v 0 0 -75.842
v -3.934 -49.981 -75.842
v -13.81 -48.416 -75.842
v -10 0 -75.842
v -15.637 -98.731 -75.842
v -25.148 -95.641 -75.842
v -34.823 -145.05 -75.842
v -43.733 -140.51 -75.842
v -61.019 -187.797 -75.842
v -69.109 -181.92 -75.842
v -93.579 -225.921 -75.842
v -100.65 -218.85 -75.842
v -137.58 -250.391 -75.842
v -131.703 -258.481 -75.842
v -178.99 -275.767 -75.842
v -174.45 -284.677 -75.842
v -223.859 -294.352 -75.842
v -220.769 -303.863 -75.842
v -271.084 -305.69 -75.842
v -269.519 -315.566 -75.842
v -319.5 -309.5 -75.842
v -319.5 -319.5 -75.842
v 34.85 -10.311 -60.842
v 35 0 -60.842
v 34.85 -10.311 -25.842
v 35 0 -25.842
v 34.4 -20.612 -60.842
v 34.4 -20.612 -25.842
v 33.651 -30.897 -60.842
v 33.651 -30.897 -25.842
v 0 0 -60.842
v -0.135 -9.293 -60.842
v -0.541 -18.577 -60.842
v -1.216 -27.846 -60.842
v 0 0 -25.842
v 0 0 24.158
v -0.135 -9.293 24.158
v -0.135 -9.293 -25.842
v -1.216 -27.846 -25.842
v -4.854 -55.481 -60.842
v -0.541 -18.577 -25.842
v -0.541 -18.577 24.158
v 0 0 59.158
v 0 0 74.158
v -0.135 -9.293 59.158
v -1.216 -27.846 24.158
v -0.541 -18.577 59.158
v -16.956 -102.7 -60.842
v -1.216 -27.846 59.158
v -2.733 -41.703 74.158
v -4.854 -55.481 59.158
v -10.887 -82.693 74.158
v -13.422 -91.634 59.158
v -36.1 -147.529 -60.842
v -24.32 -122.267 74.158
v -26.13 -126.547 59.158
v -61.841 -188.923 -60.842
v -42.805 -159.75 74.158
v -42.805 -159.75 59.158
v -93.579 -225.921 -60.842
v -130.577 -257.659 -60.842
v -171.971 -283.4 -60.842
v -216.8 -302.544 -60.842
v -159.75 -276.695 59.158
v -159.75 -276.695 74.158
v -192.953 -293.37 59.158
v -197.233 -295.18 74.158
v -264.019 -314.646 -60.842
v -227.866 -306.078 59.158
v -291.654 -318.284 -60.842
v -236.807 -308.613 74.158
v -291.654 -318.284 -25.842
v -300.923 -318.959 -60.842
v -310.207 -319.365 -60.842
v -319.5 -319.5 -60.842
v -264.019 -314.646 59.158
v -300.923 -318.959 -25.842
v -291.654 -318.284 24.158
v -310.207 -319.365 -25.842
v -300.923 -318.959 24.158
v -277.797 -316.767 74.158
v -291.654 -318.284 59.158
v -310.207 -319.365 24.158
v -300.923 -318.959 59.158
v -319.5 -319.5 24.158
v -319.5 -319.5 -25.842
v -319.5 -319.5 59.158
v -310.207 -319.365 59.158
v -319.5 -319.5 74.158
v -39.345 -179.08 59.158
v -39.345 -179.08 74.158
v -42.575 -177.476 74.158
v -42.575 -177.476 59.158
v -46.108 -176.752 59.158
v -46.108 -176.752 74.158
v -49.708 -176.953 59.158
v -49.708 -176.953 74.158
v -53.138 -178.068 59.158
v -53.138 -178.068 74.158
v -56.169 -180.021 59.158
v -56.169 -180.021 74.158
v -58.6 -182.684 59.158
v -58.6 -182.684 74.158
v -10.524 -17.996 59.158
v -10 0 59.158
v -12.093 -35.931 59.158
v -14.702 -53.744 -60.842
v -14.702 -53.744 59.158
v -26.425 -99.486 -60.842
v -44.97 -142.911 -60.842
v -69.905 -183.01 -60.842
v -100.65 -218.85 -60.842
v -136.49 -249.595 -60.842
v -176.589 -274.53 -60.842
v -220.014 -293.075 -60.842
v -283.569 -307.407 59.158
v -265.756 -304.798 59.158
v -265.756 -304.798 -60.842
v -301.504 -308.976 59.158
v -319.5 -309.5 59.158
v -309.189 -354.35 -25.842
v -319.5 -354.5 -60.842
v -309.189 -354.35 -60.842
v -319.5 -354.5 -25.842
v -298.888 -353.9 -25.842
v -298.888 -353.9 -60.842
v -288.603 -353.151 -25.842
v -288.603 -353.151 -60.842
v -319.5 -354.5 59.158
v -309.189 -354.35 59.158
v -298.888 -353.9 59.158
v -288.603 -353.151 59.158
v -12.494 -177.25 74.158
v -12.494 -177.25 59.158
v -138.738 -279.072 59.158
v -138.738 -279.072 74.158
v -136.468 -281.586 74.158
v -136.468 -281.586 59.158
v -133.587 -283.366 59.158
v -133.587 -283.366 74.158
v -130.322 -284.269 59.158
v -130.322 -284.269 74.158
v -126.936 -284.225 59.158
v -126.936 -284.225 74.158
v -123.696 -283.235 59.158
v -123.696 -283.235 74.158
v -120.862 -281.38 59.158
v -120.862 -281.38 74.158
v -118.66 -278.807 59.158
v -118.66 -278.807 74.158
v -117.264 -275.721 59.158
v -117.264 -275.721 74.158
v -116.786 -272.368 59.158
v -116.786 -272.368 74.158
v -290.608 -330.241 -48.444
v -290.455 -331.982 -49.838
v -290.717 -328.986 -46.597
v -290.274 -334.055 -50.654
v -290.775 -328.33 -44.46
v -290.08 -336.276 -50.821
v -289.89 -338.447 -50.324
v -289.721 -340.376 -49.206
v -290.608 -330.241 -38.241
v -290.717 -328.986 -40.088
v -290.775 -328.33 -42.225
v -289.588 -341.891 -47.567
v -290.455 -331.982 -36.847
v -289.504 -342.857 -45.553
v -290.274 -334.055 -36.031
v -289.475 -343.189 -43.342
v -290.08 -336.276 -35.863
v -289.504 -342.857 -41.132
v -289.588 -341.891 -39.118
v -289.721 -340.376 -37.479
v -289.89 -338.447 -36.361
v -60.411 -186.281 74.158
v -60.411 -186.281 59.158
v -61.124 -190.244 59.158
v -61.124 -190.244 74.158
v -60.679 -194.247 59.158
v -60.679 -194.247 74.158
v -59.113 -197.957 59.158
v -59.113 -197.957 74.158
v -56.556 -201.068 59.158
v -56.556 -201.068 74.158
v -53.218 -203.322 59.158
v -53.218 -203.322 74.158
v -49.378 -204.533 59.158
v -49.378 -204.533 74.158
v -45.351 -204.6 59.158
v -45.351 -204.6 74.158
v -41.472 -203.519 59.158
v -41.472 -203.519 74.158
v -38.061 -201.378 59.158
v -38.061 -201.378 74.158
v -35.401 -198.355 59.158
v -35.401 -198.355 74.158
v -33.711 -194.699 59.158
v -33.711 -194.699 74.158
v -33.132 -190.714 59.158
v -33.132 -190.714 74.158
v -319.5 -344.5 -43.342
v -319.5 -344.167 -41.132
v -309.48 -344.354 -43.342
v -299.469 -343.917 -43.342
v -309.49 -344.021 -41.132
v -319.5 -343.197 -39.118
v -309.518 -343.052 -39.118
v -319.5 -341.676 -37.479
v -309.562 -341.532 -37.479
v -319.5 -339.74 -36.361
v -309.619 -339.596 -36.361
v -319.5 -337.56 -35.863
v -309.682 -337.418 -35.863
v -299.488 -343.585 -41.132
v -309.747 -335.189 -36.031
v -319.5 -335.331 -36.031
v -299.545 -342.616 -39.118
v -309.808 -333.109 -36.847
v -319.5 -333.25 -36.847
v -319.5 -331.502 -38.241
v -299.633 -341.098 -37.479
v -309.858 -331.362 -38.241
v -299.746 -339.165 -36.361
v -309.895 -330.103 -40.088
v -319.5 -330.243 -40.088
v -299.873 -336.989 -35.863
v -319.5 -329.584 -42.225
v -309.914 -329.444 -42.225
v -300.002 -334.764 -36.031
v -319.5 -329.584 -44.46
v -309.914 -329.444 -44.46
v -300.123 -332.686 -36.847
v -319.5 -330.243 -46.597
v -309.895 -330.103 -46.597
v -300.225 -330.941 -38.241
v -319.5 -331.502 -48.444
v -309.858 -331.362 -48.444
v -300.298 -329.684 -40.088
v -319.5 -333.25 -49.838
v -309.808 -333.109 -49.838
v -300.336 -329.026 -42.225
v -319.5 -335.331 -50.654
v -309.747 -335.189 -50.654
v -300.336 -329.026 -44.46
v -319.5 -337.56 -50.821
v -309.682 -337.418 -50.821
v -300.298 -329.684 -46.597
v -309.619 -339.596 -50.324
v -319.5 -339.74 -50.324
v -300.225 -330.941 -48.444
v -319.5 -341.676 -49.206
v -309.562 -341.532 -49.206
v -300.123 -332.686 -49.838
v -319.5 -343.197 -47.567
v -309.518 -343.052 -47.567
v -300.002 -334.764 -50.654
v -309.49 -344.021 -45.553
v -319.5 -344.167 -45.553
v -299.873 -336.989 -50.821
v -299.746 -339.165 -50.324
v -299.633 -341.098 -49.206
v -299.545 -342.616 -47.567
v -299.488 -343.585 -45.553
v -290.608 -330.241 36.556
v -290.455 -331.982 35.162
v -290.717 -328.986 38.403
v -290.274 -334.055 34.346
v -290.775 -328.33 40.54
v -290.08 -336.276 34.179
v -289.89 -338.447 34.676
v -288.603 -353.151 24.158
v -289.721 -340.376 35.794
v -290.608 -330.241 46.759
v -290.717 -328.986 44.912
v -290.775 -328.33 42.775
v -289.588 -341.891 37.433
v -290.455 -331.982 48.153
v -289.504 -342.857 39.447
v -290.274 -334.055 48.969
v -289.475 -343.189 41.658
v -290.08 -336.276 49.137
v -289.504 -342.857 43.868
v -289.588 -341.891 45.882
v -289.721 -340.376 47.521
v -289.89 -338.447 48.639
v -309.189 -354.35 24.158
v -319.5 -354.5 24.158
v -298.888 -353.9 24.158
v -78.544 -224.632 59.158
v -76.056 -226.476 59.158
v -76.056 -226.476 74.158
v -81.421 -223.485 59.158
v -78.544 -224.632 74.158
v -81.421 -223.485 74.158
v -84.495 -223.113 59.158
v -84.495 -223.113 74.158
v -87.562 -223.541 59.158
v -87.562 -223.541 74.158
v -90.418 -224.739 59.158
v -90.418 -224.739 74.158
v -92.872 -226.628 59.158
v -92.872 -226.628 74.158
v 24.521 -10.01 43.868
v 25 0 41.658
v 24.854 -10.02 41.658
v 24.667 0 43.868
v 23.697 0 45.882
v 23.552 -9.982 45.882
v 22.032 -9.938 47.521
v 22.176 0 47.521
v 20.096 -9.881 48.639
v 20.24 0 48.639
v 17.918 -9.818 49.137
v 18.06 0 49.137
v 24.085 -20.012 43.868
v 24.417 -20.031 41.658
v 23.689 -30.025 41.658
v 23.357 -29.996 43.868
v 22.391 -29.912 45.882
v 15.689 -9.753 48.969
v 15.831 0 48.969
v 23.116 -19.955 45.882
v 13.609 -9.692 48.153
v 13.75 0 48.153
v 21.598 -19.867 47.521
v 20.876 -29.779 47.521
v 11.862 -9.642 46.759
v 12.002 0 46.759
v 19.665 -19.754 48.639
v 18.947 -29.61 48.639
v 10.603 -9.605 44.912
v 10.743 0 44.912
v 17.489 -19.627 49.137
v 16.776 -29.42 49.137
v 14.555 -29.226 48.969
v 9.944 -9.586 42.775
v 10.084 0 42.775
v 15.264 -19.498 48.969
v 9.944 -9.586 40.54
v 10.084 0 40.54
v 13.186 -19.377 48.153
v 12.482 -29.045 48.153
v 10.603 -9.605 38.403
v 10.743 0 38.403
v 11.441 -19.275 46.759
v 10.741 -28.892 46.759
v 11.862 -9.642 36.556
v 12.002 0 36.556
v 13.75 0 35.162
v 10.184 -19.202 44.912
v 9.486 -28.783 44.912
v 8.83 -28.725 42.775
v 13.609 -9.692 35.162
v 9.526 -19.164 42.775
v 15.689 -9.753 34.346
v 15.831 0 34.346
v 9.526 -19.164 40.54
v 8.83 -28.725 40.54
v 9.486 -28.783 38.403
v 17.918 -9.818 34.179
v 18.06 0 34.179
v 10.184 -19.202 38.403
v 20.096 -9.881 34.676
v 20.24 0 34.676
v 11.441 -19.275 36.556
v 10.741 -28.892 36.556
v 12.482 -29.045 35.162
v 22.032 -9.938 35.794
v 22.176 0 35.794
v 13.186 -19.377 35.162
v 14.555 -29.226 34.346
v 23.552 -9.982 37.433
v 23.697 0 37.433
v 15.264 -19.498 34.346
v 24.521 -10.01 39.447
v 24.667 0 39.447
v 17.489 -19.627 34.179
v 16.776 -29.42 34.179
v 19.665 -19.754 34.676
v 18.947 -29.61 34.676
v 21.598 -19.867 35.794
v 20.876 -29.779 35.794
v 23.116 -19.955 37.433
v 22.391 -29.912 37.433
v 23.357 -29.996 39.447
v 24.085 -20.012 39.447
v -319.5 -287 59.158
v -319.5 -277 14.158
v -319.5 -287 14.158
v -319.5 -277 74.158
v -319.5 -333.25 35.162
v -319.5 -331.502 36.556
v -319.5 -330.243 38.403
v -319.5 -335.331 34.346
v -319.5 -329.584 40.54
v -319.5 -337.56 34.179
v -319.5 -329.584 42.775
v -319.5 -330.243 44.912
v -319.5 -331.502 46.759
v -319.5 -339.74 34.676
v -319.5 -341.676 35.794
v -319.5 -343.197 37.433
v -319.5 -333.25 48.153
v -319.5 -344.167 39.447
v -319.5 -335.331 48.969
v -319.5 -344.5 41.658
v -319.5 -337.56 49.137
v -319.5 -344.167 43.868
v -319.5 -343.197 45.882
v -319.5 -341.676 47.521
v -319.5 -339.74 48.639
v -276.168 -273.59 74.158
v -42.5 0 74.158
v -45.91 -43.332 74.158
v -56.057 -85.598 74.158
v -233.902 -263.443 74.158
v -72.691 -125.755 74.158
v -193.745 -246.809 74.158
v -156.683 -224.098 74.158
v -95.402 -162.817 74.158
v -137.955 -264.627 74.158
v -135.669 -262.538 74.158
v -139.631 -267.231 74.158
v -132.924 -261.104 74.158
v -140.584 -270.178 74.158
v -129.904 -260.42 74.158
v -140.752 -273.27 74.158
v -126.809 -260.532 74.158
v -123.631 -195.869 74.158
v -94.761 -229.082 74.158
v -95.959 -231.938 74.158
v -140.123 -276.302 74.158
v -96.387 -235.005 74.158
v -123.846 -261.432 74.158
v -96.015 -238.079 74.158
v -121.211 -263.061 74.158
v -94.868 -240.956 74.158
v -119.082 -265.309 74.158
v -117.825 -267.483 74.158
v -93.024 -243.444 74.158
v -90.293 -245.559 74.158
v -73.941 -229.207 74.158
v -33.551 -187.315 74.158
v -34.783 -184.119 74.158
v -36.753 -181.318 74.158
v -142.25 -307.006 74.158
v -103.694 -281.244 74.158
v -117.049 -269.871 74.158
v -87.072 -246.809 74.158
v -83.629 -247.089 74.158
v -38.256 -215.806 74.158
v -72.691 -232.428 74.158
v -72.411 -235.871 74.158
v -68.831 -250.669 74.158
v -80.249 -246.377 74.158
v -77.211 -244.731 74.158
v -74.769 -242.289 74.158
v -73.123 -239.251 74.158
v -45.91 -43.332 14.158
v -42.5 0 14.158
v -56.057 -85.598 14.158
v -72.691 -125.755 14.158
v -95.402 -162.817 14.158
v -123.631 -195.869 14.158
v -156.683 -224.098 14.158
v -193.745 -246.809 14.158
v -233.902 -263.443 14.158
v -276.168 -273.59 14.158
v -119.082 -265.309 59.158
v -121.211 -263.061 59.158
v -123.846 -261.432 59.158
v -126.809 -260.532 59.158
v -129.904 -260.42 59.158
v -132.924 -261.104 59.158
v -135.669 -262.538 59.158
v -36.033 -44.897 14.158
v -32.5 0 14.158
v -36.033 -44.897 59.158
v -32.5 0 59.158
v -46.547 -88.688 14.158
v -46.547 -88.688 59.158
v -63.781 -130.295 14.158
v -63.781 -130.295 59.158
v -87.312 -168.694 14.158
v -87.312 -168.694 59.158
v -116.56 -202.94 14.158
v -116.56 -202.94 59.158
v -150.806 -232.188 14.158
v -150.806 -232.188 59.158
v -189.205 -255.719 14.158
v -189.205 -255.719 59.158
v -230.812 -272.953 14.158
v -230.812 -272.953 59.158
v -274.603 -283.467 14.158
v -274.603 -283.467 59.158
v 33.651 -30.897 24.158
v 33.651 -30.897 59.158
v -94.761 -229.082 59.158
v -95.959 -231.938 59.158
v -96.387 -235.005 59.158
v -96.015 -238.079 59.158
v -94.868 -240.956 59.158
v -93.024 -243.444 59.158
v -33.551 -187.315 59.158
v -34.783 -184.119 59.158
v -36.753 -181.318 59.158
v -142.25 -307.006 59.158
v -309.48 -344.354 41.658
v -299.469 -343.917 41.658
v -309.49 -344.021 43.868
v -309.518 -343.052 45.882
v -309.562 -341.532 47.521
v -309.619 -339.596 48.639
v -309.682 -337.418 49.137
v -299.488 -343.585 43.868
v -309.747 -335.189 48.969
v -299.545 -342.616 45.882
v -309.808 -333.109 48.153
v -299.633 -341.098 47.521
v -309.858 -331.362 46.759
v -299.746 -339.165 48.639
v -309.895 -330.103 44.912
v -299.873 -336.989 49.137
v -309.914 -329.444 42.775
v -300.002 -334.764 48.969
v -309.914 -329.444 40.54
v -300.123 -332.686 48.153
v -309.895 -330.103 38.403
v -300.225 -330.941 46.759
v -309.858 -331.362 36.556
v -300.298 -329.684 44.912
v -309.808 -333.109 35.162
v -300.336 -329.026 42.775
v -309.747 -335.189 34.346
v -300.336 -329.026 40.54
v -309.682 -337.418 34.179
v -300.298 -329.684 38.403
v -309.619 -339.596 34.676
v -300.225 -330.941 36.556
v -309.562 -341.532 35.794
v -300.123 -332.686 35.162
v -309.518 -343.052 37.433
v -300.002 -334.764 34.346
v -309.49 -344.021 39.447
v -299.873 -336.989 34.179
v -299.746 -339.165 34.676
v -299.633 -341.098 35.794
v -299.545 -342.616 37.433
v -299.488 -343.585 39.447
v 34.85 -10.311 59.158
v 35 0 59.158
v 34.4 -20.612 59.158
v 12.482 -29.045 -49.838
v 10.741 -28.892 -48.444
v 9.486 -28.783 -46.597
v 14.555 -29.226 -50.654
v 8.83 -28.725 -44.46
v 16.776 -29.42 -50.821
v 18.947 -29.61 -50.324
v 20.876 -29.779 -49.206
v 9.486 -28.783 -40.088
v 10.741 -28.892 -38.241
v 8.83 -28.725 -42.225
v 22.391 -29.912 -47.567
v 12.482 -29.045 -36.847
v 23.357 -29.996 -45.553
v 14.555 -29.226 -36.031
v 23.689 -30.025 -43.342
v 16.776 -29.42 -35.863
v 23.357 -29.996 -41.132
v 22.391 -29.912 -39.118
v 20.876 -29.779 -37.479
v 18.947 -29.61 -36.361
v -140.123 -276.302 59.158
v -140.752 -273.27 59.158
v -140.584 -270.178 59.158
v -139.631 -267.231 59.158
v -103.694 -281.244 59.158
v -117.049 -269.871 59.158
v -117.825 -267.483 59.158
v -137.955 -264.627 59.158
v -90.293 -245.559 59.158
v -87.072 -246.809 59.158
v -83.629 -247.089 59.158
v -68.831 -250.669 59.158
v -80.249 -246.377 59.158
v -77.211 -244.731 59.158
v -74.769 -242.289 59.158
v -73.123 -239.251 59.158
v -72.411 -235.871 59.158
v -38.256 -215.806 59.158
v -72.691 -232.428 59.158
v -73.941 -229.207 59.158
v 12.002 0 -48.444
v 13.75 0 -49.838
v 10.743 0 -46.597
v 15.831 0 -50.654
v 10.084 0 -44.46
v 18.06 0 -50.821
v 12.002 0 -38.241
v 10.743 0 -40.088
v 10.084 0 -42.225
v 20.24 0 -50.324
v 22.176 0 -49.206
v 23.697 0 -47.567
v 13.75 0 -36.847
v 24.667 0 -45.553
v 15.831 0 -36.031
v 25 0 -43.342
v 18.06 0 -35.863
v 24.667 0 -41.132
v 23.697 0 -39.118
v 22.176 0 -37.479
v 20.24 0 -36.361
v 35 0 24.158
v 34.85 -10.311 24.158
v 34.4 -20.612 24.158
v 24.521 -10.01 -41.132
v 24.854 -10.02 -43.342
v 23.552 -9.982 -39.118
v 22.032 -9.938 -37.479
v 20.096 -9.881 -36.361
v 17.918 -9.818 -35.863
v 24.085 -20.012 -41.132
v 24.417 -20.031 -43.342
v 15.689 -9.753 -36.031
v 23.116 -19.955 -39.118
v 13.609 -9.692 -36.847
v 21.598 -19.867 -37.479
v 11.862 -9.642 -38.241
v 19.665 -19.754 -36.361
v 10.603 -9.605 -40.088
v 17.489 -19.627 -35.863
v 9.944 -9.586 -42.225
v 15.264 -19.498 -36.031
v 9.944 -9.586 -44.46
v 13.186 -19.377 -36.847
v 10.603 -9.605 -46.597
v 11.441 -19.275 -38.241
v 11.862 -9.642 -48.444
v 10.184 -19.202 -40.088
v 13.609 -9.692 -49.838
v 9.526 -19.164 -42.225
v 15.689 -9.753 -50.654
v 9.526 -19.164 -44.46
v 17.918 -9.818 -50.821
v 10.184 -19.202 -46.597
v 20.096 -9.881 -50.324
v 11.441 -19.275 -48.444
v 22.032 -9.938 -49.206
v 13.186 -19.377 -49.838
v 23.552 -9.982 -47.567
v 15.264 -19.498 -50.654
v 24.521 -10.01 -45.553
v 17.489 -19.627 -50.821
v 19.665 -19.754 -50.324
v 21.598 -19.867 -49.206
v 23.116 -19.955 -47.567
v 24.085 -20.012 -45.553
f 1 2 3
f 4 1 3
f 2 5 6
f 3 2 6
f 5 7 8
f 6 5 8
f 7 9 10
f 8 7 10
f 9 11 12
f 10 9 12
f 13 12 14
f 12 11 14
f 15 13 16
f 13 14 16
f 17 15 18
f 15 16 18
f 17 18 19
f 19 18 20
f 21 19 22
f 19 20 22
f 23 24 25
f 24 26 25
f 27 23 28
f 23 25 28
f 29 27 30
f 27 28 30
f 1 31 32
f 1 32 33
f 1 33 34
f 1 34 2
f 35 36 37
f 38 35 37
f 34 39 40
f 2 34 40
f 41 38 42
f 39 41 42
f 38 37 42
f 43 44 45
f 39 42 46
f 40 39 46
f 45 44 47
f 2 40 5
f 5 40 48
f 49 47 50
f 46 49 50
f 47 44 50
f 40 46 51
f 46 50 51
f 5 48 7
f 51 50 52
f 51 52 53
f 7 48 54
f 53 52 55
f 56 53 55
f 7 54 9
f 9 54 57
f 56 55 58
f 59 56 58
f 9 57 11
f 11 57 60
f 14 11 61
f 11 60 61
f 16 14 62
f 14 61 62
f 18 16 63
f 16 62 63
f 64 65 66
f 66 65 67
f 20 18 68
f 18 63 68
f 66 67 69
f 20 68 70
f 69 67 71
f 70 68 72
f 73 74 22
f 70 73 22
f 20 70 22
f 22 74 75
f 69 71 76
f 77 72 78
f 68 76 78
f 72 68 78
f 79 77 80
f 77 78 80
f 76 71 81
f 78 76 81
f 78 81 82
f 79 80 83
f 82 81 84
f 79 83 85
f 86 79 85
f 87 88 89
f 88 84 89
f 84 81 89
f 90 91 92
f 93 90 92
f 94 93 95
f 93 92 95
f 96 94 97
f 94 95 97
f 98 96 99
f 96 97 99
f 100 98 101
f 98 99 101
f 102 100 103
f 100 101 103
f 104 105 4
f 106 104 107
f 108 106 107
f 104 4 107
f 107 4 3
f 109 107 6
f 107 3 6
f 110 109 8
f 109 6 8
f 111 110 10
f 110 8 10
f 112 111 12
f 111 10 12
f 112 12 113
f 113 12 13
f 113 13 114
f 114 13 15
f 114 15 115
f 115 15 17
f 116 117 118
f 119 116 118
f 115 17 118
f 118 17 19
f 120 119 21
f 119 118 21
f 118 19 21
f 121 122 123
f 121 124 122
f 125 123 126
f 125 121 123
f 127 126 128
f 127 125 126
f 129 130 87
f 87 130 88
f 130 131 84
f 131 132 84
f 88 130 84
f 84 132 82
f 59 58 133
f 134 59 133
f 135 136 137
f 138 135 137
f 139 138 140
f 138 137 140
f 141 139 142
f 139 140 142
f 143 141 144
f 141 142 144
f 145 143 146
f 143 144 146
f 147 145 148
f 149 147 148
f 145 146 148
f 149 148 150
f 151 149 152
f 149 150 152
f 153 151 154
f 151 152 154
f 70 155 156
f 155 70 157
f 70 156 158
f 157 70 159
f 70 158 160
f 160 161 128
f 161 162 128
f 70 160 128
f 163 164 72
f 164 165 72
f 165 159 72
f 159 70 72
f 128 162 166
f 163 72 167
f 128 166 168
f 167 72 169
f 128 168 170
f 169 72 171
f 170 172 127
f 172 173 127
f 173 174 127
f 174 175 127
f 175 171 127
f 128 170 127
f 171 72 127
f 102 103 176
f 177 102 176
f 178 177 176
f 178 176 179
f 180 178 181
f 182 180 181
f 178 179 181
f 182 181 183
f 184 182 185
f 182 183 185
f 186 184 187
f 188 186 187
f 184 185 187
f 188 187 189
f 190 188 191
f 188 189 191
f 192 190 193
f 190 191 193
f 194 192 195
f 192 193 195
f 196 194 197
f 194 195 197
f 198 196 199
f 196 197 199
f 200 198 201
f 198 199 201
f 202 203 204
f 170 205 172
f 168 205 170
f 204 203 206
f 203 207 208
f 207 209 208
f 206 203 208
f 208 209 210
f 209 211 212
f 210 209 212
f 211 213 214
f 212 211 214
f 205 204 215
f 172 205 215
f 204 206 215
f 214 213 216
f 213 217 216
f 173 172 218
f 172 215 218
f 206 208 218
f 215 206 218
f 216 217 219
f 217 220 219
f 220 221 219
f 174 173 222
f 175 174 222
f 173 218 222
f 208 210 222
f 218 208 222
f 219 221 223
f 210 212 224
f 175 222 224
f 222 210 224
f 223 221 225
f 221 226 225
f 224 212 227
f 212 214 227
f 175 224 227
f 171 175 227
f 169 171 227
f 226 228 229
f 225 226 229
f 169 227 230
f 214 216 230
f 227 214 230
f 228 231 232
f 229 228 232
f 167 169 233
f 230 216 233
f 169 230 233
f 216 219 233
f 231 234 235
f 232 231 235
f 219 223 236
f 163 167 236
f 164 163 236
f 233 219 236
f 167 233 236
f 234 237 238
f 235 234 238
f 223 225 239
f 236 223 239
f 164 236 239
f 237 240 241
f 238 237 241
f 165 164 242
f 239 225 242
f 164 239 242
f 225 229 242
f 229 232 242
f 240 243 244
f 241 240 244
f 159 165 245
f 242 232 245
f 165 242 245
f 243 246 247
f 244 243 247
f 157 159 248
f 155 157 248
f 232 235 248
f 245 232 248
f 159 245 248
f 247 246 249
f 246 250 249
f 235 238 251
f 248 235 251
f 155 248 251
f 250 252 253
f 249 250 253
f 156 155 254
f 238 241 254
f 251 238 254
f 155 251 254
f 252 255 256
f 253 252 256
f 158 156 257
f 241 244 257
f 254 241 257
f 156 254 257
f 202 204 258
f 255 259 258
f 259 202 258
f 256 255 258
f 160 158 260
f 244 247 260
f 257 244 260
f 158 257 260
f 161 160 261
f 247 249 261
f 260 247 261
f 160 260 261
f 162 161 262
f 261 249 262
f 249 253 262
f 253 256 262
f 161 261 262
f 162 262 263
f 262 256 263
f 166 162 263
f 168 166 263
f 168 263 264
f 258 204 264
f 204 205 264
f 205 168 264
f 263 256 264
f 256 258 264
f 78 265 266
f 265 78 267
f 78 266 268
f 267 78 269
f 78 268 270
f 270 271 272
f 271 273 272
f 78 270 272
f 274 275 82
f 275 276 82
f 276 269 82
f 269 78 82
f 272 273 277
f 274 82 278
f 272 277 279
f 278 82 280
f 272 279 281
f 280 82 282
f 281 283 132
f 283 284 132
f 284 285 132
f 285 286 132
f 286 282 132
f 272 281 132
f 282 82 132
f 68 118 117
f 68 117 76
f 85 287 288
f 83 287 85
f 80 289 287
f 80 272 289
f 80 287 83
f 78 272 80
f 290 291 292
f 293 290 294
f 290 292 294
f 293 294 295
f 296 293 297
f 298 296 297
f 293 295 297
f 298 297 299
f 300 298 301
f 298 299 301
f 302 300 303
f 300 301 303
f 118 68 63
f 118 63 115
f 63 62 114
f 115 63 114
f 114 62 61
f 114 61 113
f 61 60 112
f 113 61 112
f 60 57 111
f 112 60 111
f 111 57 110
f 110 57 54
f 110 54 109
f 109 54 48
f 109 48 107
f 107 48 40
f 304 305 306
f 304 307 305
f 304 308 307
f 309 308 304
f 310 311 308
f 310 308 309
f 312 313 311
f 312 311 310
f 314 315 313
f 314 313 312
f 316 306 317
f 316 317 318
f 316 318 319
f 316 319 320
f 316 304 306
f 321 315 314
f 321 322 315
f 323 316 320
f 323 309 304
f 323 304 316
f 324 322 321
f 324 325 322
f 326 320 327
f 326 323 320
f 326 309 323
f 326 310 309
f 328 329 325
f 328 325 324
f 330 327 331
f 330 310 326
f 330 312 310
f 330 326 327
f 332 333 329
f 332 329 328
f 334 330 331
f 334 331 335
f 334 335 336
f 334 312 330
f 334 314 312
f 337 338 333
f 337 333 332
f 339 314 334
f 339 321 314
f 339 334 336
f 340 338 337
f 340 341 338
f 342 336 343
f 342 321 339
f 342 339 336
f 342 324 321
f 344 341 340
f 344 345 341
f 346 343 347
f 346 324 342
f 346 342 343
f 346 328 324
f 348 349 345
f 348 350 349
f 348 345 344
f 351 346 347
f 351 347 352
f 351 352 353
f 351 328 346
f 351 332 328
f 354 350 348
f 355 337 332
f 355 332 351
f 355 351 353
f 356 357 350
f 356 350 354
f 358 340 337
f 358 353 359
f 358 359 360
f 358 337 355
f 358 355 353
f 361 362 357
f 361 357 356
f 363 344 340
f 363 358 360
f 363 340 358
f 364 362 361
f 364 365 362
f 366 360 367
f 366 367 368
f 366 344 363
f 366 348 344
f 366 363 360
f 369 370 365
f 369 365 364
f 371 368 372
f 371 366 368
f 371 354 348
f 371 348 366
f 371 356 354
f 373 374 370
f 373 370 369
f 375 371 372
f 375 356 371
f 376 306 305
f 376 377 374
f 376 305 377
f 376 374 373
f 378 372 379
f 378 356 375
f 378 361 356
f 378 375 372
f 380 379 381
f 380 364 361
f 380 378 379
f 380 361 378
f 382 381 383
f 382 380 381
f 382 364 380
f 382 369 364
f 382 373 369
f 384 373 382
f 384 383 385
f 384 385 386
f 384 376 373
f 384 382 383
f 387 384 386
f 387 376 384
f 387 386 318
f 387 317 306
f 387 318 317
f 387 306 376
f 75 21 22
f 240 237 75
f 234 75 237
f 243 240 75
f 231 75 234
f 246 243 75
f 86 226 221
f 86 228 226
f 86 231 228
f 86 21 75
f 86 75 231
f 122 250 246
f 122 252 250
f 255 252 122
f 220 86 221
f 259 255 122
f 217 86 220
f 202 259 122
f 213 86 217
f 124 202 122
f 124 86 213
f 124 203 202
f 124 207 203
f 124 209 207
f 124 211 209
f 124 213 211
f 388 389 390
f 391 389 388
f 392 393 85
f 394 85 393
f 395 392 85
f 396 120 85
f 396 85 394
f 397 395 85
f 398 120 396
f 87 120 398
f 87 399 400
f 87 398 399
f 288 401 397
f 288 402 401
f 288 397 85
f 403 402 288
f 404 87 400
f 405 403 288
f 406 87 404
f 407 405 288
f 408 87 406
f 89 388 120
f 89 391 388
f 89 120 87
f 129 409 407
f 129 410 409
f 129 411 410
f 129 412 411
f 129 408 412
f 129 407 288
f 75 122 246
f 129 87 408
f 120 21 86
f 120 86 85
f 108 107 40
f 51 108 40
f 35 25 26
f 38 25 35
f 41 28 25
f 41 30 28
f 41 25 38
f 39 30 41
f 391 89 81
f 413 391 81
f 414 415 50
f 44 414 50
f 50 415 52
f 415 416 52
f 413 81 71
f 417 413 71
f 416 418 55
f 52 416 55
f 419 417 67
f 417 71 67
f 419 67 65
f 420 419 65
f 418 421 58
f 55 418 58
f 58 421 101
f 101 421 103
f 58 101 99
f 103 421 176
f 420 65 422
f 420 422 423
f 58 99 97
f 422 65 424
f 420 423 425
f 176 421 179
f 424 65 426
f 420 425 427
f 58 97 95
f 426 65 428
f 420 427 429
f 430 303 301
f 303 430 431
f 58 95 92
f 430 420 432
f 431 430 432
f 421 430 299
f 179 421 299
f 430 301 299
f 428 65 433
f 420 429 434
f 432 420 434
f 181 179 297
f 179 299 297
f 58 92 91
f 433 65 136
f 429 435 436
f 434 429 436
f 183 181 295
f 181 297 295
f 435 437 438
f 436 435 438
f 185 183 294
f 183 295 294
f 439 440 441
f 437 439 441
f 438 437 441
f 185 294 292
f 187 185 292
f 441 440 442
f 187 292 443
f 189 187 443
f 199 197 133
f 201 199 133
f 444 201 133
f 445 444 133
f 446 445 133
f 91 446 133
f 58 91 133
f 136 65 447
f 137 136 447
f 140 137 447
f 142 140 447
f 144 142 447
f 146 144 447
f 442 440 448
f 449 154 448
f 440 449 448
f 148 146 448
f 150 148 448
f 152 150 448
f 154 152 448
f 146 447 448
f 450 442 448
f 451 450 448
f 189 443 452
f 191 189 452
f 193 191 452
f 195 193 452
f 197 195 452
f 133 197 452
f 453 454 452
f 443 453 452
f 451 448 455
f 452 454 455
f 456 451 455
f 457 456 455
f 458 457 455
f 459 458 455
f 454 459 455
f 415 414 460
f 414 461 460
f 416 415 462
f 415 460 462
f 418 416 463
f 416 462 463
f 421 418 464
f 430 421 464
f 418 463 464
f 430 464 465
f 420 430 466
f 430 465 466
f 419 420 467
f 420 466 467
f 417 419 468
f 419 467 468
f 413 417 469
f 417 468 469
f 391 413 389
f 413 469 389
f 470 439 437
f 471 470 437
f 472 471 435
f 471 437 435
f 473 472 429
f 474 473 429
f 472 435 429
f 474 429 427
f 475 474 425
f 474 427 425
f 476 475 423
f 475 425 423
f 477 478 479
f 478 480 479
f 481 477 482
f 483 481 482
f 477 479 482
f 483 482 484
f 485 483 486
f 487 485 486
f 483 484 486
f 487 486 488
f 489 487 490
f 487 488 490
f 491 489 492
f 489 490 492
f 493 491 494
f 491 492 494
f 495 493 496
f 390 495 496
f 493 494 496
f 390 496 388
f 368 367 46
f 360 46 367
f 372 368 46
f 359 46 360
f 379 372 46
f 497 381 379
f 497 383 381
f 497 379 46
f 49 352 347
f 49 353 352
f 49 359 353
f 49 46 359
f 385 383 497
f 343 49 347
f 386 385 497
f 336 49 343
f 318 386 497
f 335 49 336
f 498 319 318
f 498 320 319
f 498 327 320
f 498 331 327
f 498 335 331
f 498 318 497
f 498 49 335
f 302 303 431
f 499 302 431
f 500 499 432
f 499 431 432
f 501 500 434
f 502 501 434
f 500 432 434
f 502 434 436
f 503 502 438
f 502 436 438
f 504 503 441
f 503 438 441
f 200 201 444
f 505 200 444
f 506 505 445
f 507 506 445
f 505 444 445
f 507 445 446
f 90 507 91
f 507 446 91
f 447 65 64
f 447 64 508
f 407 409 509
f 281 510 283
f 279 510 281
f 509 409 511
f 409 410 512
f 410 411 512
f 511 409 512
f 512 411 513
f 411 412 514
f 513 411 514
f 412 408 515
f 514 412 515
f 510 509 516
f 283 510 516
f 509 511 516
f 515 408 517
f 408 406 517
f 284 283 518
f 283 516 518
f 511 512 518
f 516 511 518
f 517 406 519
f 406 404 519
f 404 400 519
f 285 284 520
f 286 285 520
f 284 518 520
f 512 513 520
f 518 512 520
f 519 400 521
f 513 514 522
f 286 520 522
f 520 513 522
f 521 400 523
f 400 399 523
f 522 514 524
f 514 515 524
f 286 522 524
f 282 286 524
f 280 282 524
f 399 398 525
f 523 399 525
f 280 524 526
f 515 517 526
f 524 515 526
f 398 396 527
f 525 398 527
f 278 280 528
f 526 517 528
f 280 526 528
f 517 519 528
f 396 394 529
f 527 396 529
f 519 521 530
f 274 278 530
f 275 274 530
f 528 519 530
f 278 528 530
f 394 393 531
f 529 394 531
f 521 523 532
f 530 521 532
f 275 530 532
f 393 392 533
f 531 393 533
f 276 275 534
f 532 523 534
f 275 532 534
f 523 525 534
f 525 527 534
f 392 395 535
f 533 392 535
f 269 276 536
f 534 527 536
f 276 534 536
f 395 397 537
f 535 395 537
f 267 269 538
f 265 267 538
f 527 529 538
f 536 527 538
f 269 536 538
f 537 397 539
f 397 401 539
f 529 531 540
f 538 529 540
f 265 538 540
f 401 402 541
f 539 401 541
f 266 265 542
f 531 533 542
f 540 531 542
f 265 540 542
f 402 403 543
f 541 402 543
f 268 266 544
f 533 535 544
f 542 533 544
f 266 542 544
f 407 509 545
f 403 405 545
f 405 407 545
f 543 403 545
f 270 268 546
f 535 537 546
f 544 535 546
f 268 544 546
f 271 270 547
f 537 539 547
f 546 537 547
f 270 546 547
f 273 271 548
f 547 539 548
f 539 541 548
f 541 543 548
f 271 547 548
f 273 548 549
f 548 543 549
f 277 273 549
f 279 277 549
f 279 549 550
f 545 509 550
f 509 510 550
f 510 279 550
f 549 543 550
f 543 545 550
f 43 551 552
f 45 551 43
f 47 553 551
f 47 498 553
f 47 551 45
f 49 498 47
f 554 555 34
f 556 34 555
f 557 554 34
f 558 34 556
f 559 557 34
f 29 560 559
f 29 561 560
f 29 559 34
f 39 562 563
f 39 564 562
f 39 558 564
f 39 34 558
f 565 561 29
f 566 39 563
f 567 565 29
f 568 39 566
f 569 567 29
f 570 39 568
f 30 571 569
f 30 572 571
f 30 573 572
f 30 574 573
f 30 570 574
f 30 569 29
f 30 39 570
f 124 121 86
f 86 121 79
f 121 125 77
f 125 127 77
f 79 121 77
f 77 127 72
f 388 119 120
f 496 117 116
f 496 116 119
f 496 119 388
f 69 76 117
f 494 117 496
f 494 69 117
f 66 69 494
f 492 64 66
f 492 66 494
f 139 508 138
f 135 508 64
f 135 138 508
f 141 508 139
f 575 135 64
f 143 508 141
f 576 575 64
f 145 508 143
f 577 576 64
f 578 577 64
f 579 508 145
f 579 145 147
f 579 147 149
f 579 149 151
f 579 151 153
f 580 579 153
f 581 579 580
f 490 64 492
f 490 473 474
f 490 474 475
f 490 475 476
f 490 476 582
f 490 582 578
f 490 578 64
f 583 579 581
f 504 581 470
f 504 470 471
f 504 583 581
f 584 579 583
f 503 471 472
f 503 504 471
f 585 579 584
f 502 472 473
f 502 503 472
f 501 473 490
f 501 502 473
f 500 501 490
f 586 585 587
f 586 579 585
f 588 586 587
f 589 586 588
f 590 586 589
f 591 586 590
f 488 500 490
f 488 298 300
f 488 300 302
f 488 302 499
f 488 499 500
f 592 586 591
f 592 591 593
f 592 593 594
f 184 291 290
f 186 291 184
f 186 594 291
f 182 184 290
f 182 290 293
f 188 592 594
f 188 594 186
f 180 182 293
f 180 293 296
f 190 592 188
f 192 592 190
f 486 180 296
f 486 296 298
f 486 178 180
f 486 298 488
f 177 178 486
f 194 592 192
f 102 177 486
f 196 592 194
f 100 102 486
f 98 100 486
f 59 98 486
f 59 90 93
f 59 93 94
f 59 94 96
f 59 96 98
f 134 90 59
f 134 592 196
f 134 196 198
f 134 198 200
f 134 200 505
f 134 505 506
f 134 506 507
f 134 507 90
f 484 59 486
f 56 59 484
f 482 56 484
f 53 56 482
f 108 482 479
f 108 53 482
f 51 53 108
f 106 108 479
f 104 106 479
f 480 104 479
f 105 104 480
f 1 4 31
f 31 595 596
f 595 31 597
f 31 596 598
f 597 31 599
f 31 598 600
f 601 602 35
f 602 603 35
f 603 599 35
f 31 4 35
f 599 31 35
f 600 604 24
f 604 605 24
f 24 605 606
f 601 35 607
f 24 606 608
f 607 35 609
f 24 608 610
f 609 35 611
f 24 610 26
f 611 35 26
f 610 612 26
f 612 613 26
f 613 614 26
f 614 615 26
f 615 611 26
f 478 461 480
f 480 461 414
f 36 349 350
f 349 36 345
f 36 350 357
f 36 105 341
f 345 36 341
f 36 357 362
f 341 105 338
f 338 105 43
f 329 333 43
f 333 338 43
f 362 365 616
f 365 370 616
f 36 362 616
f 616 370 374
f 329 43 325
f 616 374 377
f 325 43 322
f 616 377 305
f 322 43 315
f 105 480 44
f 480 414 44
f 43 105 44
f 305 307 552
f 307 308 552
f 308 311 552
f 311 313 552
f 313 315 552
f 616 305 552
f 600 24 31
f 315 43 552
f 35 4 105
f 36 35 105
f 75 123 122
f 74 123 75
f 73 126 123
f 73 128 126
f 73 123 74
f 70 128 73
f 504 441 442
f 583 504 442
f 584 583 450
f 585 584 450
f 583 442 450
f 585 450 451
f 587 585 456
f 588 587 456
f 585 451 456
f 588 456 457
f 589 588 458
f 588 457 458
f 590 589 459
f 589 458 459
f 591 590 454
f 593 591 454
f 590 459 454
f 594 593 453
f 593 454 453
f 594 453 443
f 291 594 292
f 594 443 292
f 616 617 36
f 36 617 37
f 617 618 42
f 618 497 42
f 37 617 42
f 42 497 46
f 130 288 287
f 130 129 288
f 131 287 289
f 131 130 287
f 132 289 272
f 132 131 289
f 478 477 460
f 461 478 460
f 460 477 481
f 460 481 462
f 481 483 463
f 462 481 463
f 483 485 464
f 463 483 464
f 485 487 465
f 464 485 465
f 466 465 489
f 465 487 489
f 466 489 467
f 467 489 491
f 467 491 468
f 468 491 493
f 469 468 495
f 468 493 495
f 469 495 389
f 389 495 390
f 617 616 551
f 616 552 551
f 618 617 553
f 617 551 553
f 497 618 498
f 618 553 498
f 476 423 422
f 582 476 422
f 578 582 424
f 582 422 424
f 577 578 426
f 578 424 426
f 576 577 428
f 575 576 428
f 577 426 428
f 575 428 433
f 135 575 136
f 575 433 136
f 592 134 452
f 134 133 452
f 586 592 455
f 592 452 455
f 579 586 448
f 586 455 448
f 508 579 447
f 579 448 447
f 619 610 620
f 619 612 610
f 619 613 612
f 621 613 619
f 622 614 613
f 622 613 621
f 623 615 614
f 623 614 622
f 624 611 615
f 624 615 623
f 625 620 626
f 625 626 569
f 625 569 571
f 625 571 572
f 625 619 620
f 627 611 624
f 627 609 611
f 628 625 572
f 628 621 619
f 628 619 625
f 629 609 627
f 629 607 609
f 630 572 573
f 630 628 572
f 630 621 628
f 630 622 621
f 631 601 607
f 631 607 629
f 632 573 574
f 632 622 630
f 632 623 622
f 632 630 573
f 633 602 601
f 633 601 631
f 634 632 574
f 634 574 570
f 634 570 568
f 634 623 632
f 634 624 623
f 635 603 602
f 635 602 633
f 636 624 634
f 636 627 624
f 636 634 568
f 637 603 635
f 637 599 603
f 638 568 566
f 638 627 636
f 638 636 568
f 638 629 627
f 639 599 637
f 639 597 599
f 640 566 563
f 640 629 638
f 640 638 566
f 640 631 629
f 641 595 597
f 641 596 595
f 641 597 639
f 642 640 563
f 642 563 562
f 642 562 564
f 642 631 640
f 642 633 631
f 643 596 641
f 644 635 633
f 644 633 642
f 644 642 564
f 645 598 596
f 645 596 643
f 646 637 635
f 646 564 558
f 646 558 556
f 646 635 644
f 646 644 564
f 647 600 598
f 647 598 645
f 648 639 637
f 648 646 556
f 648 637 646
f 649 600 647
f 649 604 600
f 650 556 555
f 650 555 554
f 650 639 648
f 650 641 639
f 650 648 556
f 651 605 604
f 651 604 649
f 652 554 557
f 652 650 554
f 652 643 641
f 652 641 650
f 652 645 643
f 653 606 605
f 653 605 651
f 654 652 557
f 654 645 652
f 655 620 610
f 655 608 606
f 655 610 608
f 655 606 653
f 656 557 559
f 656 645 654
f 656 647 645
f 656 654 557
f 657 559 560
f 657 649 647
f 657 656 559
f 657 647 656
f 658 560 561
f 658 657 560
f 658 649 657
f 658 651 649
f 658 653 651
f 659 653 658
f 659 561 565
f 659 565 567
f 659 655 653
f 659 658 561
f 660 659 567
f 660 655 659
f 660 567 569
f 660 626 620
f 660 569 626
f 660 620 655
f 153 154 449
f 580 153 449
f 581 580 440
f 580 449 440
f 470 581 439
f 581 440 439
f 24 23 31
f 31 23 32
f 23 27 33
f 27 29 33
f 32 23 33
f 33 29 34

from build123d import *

# Parameters (mm, degrees)
F1_ANGLE       = 90
F2_W           = 35
F2_H           = 35
F2_R           = 7.5
F3_ANGLE       = 5
F4_ANGLE_START = 270
F4_ANGLE       = 5
F5_W           = 10
F5_H           = 120
F6_ANGLE_START = 280
F6_ANGLE       = 70
F7_W           = 35
F7_H           = 15
F8_ANGLE_START = 30
F8_ANGLE       = 30
F10_DEPTH      = 15


with BuildPart() as f1:
    # F0 (on Front) → F1 (revolve)
    with BuildSketch(Plane.XZ):
        Polygon((0, -75.8424619118), (0, 74.1575380882), (-42.5, 74.1575380882), (-42.5, 14.1575380882), (-32.5, 14.1575380882), (-32.5, 59.1575380882), (-10, 59.1575380882), (-10, -75.8424619118), align=None)
    revolve(axis=Axis((-319.5, 0, -5.3764432669), (0, 0, -1)), revolution_arc=F1_ANGLE)

    # F2 (on face) → F3 (revolve)
    with BuildSketch(Plane(origin=(-319.5, 0, 0), x_dir=(0, -1, 0), z_dir=(-1, 0, 0))):
        with Locations((337, 41.6575380882)):
            Rectangle(F2_W, F2_H)
        with Locations((337, 41.6575380882)):
            Circle(F2_R, mode=Mode.SUBTRACT)
        with Locations((337, -43.3424619118)):
            Rectangle(F2_W, F2_H)
        with Locations((337, -43.3424619118)):
            Circle(F2_R, mode=Mode.SUBTRACT)
    revolve(axis=Axis((-319.5, 0, 7.2890669107), (0, 0, 1)), revolution_arc=F3_ANGLE)

    # F2 (on face) → F4 (revolve)
    with BuildSketch(Plane(origin=(-319.5, 0, 0), x_dir=(0, -1, 0), z_dir=(-1, 0, 0)), mode=Mode.PRIVATE) as f4_sk:
        with Locations((337, 41.6575380882)):
            Rectangle(F2_W, F2_H)
        with Locations((337, 41.6575380882)):
            Circle(F2_R, mode=Mode.SUBTRACT)
        with Locations((337, -43.3424619118)):
            Rectangle(F2_W, F2_H)
        with Locations((337, -43.3424619118)):
            Circle(F2_R, mode=Mode.SUBTRACT)
    revolve(f4_sk.sketch.rotate(Axis((-319.5, 0, 74.1575380882), (0, 0, -1)), F4_ANGLE_START), axis=Axis((-319.5, 0, 74.1575380882), (0, 0, -1)), revolution_arc=F4_ANGLE)

    # F5 (on Front) → F6 (revolve, cut)
    with BuildSketch(Plane.XZ, mode=Mode.PRIVATE) as f6_sk:
        with Locations((-5, -0.8424619118)):
            Rectangle(F5_W, F5_H)
    revolve(f6_sk.sketch.rotate(Axis((-319.5, 0, -29.9057289958), (0, 0, 1)), F6_ANGLE_START), axis=Axis((-319.5, 0, -29.9057289958), (0, 0, 1)), revolution_arc=F6_ANGLE, mode=Mode.SUBTRACT)

    # F7 (on Front) → F8 (revolve)
    with BuildSketch(Plane.XZ, mode=Mode.PRIVATE) as f8_sk:
        with Locations((17.5, 66.6575380882)):
            Rectangle(F7_W, F7_H)
    revolve(f8_sk.sketch.rotate(Axis((-319.5, 0, -44.4073081017), (0, 0, -1)), F8_ANGLE_START), axis=Axis((-319.5, 0, -44.4073081017), (0, 0, -1)), revolution_arc=F8_ANGLE)

    # F9 (on face) → F10 (cut)
    with BuildSketch(Plane.XY.offset(74.1575380882)):
        with BuildLine():
            ThreePointArc((-128.7858349133, -272.3680547261), (-123.9019759301, -268.8822474243), (-119.0818139536, -265.3088779176))
            ThreePointArc((-119.0818139536, -265.3088779176), (-126.8087717489, -260.5320409865), (-135.6687521495, -262.5382301946))
            Line((-135.6687521495, -262.5382301946), (-128.7858349133, -272.3680547261))
        make_face()
        with BuildLine():
            ThreePointArc((-138.7382619085, -279.07247095), (-125.2807759939, -283.8447512008), (-116.7858349133, -272.3680547261))
            ThreePointArc((-116.7858349133, -272.3680547261), (-117.3742563302, -268.6564682402), (-119.0818139536, -265.3088779176))
            ThreePointArc((-119.0818139536, -265.3088779176), (-123.9019759301, -268.8822474243), (-128.7858349133, -272.3680547261))
            ThreePointArc((-128.7858349133, -272.3680547261), (-133.7318004616, -275.7651646606), (-138.7382619085, -279.07247095))
        make_face()
        with BuildLine():
            ThreePointArc((-135.6687521495, -262.5382301946), (-140.5842451107, -270.1777312768), (-138.7382619085, -279.07247095))
            ThreePointArc((-138.7382619085, -279.07247095), (-133.7318004616, -275.7651646606), (-128.7858349133, -272.3680547261))
            Line((-128.7858349133, -272.3680547261), (-135.6687521495, -262.5382301946))
        make_face()
        with BuildLine():
            ThreePointArc((-92.8722766297, -226.6277233703), (-96.3865067666, -235.0047296602), (-93.0240128621, -243.4437866324))
            ThreePointArc((-93.0240128621, -243.4437866324), (-88.6679185241, -239.3173628501), (-84.3869952555, -235.1130047445))
            Line((-84.3869952555, -235.1130047445), (-92.8722766297, -226.6277233703))
        make_face()
        with BuildLine():
            ThreePointArc((-84.3869952555, -235.1130047445), (-88.6679185241, -239.3173628501), (-93.0240128621, -243.4437866324))
            ThreePointArc((-93.0240128621, -243.4437866324), (-79.8950141379, -246.2405429107), (-72.3869952555, -235.1130047445))
            ThreePointArc((-72.3869952555, -235.1130047445), (-73.3423272511, -230.4209573585), (-76.0562133676, -226.4759871379))
            ThreePointArc((-76.0562133676, -226.4759871379), (-80.1826371499, -230.8320814759), (-84.3869952555, -235.1130047445))
        make_face()
        with BuildLine():
            ThreePointArc((-76.0562133676, -226.4759871379), (-84.4952703398, -223.1134932334), (-92.8722766297, -226.6277233703))
            Line((-92.8722766297, -226.6277233703), (-84.3869952555, -235.1130047445))
            ThreePointArc((-84.3869952555, -235.1130047445), (-80.1826371499, -230.8320814759), (-76.0562133676, -226.4759871379))
        make_face()
        with BuildLine():
            ThreePointArc((-47.1319452739, -190.7141650867), (-51.2073455895, -196.4059611859), (-55.4016699554, -202.010697904))
            ThreePointArc((-55.4016699554, -202.010697904), (-40.7985475105, -203.1996796044), (-33.1319452739, -190.7141650867))
            ThreePointArc((-33.1319452739, -190.7141650867), (-34.7825326257, -184.1193180647), (-39.3450891659, -179.0795240543))
            ThreePointArc((-39.3450891659, -179.0795240543), (-43.1772754806, -184.9378325658), (-47.1319452739, -190.7141650867))
        make_face()
        with BuildLine():
            ThreePointArc((-58.600073894, -182.6840949778), (-60.9440815462, -192.9999672643), (-55.4016699554, -202.010697904))
            ThreePointArc((-55.4016699554, -202.010697904), (-51.2073455895, -196.4059611859), (-47.1319452739, -190.7141650867))
            Line((-47.1319452739, -190.7141650867), (-58.600073894, -182.6840949778))
        make_face()
        with BuildLine():
            ThreePointArc((-47.1319452739, -190.7141650867), (-43.1772754806, -184.9378325658), (-39.3450891659, -179.0795240543))
            ThreePointArc((-39.3450891659, -179.0795240543), (-49.7080226626, -176.953212166), (-58.600073894, -182.6840949778))
            Line((-58.600073894, -182.6840949778), (-47.1319452739, -190.7141650867))
        make_face()
    extrude(amount=-F10_DEPTH, mode=Mode.SUBTRACT)


solid = f1.part
